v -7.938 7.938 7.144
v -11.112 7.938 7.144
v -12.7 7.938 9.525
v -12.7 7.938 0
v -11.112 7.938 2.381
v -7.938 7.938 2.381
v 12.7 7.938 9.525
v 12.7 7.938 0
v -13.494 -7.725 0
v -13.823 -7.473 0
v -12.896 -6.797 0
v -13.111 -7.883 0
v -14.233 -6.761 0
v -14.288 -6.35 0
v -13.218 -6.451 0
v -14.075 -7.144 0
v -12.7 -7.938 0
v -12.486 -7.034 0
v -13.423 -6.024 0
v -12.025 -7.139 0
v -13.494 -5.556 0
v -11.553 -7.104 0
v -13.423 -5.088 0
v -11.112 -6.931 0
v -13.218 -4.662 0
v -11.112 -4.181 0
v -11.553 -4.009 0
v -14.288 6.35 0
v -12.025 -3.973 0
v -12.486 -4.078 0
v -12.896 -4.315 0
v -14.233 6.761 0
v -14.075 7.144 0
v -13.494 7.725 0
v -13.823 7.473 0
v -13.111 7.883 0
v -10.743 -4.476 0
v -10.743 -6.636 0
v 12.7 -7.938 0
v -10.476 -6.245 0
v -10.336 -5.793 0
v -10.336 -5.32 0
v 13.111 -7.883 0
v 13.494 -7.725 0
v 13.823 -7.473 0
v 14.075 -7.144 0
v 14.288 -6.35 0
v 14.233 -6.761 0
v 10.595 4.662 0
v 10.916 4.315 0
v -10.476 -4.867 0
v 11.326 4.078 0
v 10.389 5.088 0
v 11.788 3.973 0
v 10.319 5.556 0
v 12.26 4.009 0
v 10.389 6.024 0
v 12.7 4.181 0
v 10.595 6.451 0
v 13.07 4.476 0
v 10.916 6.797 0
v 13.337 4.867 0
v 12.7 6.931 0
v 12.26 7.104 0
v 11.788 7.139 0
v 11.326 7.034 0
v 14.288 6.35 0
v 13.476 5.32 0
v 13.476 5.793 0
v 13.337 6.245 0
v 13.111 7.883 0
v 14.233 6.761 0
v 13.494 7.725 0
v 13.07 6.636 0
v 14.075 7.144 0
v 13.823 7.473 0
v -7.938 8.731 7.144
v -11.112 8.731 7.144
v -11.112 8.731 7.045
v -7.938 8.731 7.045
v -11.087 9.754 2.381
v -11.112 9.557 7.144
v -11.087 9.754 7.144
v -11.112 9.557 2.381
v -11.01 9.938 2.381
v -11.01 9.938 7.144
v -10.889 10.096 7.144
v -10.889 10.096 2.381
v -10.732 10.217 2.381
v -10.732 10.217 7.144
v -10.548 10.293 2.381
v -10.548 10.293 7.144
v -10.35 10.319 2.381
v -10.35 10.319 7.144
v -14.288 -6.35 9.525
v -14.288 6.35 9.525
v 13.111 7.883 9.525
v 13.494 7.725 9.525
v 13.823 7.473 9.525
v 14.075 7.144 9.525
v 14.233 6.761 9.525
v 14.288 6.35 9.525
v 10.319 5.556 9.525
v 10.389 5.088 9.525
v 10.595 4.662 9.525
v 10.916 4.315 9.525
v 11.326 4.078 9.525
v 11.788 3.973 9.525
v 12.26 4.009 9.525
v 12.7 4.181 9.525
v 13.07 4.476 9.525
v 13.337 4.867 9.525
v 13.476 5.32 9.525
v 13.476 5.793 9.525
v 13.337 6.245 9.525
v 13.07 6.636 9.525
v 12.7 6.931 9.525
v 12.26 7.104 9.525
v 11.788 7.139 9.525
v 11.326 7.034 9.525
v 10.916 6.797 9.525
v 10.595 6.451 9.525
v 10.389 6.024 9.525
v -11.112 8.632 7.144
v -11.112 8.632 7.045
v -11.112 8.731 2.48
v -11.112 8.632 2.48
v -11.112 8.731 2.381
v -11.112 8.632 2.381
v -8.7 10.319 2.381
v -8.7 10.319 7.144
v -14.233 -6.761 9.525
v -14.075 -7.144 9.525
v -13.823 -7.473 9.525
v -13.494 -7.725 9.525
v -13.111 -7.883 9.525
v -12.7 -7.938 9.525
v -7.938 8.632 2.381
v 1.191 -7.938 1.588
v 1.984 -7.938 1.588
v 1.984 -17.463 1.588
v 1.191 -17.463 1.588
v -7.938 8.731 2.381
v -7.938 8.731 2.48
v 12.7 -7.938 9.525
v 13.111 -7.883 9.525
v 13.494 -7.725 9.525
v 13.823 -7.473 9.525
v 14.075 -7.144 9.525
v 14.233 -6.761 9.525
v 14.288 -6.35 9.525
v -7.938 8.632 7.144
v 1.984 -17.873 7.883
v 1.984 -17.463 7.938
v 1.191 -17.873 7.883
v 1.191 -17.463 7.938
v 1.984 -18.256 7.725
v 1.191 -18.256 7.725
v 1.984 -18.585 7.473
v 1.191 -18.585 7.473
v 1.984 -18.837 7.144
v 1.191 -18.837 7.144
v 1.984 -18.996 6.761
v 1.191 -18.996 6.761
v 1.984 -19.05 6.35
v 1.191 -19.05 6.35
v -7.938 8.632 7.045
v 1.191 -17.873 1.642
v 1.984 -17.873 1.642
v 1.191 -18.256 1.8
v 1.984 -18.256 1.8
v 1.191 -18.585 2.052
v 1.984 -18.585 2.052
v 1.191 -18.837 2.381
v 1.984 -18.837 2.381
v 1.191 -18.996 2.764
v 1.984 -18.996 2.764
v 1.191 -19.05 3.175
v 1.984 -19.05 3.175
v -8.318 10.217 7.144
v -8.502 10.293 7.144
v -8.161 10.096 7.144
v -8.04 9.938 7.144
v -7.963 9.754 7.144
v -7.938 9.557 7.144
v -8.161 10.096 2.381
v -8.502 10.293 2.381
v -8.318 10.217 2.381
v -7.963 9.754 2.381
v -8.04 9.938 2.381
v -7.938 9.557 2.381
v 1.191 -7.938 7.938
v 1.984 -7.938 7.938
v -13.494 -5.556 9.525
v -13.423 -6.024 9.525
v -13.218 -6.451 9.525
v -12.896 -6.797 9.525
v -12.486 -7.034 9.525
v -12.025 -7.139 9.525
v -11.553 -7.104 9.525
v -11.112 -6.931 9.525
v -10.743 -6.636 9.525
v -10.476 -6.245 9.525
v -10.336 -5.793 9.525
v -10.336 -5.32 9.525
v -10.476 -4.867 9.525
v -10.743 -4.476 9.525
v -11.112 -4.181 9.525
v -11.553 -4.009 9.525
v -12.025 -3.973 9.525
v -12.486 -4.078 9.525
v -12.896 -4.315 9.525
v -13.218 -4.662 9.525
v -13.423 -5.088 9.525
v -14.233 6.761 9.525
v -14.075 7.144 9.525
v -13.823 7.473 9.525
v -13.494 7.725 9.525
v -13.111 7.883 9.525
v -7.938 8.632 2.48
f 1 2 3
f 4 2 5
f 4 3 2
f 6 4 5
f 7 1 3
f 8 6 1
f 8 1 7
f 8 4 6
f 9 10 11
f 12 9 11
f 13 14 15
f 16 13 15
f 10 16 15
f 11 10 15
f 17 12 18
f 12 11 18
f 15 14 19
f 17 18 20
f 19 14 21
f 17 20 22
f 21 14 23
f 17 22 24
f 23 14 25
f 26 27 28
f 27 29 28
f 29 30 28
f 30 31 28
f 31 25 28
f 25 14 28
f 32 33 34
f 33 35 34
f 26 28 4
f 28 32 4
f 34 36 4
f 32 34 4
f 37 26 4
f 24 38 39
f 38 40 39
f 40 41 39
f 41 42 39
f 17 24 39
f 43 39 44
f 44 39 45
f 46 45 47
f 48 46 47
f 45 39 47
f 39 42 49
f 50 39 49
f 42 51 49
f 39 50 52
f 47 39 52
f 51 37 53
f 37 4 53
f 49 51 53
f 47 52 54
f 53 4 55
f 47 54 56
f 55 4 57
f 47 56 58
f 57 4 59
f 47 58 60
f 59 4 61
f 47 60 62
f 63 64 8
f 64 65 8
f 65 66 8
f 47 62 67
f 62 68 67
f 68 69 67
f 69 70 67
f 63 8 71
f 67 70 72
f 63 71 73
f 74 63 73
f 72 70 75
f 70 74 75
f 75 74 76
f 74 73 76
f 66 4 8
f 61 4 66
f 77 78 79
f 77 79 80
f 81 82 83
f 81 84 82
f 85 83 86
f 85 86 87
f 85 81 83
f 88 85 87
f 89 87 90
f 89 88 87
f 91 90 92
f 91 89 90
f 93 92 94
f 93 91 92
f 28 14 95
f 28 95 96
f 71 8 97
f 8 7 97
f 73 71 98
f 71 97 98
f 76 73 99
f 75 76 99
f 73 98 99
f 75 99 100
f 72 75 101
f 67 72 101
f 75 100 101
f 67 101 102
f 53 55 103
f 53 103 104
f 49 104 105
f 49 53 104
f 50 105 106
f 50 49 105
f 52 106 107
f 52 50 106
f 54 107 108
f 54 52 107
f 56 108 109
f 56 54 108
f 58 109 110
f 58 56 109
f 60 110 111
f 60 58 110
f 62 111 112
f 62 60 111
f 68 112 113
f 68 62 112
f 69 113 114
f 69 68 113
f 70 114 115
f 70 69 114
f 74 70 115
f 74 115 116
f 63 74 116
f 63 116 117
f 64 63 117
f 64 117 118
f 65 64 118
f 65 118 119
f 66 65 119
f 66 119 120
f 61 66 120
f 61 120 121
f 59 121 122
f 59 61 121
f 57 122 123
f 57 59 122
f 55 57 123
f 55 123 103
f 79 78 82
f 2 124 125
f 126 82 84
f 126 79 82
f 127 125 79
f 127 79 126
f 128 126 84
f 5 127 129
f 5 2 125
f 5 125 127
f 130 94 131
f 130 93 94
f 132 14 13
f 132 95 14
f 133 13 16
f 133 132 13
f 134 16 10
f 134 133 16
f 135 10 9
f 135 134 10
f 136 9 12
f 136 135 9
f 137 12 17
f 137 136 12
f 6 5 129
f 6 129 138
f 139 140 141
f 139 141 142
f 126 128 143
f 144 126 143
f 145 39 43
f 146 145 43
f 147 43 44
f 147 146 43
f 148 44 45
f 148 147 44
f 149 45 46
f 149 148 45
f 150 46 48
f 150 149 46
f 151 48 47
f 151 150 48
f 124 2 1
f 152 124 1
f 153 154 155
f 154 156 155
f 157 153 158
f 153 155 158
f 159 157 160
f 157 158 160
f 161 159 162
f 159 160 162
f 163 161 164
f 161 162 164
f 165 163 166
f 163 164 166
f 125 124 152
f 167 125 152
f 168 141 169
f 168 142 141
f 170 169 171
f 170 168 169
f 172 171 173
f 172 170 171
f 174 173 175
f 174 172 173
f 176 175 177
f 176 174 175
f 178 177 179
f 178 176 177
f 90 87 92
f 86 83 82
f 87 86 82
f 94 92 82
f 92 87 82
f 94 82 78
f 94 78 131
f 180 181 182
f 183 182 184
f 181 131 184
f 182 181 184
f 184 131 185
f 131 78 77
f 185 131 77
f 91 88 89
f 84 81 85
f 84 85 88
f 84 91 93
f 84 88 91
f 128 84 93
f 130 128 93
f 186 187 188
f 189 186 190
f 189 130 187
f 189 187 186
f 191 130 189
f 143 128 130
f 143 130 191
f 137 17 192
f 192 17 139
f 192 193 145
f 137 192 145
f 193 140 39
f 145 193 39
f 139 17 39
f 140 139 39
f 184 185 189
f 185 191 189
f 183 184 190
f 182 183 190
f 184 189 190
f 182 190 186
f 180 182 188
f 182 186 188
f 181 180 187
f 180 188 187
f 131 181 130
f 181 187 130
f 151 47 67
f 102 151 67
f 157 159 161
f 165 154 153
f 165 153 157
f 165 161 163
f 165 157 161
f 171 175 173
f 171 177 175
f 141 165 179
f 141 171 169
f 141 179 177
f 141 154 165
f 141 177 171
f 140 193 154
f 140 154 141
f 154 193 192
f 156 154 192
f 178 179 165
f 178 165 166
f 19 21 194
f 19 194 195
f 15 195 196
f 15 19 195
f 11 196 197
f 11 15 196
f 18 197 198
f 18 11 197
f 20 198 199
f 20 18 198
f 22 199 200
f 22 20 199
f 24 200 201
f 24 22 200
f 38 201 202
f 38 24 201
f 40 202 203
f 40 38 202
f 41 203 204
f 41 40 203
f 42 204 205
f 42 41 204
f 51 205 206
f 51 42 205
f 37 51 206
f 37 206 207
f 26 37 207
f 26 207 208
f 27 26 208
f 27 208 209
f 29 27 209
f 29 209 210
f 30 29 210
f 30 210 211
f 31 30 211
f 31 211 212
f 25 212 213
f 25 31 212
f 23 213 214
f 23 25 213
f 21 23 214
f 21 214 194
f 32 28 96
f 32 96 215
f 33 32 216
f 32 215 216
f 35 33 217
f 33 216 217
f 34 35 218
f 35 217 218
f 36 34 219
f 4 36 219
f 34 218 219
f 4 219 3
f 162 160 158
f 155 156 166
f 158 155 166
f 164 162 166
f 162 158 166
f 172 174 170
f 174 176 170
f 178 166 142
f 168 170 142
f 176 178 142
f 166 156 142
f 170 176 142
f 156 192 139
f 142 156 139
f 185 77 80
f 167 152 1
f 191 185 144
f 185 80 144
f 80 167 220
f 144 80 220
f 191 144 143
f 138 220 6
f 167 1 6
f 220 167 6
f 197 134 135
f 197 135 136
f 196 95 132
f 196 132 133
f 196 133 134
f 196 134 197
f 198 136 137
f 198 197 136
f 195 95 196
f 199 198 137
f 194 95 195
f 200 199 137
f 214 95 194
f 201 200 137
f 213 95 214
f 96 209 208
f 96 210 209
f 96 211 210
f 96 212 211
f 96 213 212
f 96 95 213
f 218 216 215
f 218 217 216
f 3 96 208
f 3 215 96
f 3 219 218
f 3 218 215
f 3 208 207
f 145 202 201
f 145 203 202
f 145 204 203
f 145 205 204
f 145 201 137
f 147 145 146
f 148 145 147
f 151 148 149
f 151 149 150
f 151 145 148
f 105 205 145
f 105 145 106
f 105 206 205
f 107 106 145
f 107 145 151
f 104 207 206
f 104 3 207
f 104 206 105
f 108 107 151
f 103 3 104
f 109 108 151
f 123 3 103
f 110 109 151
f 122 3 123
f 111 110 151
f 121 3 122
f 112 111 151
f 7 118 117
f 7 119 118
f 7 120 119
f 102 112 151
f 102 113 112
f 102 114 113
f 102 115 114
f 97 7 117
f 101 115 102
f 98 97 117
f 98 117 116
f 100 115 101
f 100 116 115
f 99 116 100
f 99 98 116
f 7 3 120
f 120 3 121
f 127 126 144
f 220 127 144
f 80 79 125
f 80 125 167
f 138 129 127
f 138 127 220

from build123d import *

# Parameters (mm, degrees)
SKETCH1_W           = 28.575
SKETCH1_H           = 15.875
SKETCH1_R           = 1.5875
BOSS_EXTRUDE1_DEPTH = 9.525
FILLET1_R           = 1.5875
SKETCH2_W           = 3.175
SKETCH2_H           = 4.7625
BOSS_EXTRUDE2_DEPTH = 2.38125
FILLET2_R           = 0.762
SKETCH3_W           = 0.79375
SKETCH3_H           = 6.35
BOSS_EXTRUDE3_DEPTH = 11.1125
FILLET3_R           = 1.5875
SKETCH4_W           = 3.175
SKETCH4_H           = 0.09921875
CUT_EXTRUDE1_DEPTH  = 0.09921875


with BuildPart() as part:
    # Sketch1 → Boss-Extrude1 (new body)
    with BuildSketch(Plane.XY):
        Rectangle(SKETCH1_W, SKETCH1_H)
        with Locations(Location((11.90625, 5.55625, 0), (0, 0, 180))):
            Circle(SKETCH1_R, mode=Mode.SUBTRACT)
        with Locations(Location((-11.90625, -5.55625, 0), (0, 0, 180))):
            Circle(SKETCH1_R, mode=Mode.SUBTRACT)
    extrude(amount=BOSS_EXTRUDE1_DEPTH)

    # Fillet1
    fillet1_edges = [part.edges().sort_by_distance(p)[0] for p in [
        (-14.2875, 7.9375, 4.7625),
        (14.2875, 7.9375, 4.7625),
        (14.2875, -7.9375, 4.7625),
        (-14.2875, -7.9375, 4.7625),
    ]]
    fillet(fillet1_edges, radius=FILLET1_R)

    # Sketch2 → Boss-Extrude2 (add)
    with BuildSketch(Plane(origin=(0, 7.9375, 0), x_dir=(1, 0, 0), z_dir=(0, 1, 0))):
        with Locations((-9.525, -4.7625)):
            Rectangle(SKETCH2_W, SKETCH2_H)
    extrude(amount=BOSS_EXTRUDE2_DEPTH)

    # Fillet2
    fillet2_edges = [part.edges().sort_by_distance(p)[0] for p in [
        (-11.1125, 10.31875, 4.7625),
        (-7.9375, 10.31875, 4.7625),
    ]]
    fillet(fillet2_edges, radius=FILLET2_R)

    # Sketch3 → Boss-Extrude3 (add)
    with BuildSketch(Plane(origin=(0, -7.9375, 0), x_dir=(-1, 0, 0), z_dir=(0, -1, 0))):
        with Locations((-1.5875, -4.7625)):
            Rectangle(SKETCH3_W, SKETCH3_H)
    extrude(amount=BOSS_EXTRUDE3_DEPTH)

    # Fillet3
    fillet3_edges = [part.edges().sort_by_distance(p)[0] for p in [
        (1.5875, -19.05, 1.5875),
        (1.5875, -19.05, 7.9375),
    ]]
    fillet(fillet3_edges, radius=FILLET3_R)

    # Sketch4 → Cut-Extrude1 (cut)
    with BuildSketch(Plane.XY.offset(7.14375)):
        with Locations((-9.525, 8.681640625)):
            Rectangle(SKETCH4_W, SKETCH4_H)
    cut_extrude1 = extrude(amount=-CUT_EXTRUDE1_DEPTH, mode=Mode.SUBTRACT)

    # Mirror1: Cut-Extrude1 across plane
    add(cut_extrude1.mirror(Plane.XY.offset(4.7625)), mode=Mode.SUBTRACT)


solid = part.part
